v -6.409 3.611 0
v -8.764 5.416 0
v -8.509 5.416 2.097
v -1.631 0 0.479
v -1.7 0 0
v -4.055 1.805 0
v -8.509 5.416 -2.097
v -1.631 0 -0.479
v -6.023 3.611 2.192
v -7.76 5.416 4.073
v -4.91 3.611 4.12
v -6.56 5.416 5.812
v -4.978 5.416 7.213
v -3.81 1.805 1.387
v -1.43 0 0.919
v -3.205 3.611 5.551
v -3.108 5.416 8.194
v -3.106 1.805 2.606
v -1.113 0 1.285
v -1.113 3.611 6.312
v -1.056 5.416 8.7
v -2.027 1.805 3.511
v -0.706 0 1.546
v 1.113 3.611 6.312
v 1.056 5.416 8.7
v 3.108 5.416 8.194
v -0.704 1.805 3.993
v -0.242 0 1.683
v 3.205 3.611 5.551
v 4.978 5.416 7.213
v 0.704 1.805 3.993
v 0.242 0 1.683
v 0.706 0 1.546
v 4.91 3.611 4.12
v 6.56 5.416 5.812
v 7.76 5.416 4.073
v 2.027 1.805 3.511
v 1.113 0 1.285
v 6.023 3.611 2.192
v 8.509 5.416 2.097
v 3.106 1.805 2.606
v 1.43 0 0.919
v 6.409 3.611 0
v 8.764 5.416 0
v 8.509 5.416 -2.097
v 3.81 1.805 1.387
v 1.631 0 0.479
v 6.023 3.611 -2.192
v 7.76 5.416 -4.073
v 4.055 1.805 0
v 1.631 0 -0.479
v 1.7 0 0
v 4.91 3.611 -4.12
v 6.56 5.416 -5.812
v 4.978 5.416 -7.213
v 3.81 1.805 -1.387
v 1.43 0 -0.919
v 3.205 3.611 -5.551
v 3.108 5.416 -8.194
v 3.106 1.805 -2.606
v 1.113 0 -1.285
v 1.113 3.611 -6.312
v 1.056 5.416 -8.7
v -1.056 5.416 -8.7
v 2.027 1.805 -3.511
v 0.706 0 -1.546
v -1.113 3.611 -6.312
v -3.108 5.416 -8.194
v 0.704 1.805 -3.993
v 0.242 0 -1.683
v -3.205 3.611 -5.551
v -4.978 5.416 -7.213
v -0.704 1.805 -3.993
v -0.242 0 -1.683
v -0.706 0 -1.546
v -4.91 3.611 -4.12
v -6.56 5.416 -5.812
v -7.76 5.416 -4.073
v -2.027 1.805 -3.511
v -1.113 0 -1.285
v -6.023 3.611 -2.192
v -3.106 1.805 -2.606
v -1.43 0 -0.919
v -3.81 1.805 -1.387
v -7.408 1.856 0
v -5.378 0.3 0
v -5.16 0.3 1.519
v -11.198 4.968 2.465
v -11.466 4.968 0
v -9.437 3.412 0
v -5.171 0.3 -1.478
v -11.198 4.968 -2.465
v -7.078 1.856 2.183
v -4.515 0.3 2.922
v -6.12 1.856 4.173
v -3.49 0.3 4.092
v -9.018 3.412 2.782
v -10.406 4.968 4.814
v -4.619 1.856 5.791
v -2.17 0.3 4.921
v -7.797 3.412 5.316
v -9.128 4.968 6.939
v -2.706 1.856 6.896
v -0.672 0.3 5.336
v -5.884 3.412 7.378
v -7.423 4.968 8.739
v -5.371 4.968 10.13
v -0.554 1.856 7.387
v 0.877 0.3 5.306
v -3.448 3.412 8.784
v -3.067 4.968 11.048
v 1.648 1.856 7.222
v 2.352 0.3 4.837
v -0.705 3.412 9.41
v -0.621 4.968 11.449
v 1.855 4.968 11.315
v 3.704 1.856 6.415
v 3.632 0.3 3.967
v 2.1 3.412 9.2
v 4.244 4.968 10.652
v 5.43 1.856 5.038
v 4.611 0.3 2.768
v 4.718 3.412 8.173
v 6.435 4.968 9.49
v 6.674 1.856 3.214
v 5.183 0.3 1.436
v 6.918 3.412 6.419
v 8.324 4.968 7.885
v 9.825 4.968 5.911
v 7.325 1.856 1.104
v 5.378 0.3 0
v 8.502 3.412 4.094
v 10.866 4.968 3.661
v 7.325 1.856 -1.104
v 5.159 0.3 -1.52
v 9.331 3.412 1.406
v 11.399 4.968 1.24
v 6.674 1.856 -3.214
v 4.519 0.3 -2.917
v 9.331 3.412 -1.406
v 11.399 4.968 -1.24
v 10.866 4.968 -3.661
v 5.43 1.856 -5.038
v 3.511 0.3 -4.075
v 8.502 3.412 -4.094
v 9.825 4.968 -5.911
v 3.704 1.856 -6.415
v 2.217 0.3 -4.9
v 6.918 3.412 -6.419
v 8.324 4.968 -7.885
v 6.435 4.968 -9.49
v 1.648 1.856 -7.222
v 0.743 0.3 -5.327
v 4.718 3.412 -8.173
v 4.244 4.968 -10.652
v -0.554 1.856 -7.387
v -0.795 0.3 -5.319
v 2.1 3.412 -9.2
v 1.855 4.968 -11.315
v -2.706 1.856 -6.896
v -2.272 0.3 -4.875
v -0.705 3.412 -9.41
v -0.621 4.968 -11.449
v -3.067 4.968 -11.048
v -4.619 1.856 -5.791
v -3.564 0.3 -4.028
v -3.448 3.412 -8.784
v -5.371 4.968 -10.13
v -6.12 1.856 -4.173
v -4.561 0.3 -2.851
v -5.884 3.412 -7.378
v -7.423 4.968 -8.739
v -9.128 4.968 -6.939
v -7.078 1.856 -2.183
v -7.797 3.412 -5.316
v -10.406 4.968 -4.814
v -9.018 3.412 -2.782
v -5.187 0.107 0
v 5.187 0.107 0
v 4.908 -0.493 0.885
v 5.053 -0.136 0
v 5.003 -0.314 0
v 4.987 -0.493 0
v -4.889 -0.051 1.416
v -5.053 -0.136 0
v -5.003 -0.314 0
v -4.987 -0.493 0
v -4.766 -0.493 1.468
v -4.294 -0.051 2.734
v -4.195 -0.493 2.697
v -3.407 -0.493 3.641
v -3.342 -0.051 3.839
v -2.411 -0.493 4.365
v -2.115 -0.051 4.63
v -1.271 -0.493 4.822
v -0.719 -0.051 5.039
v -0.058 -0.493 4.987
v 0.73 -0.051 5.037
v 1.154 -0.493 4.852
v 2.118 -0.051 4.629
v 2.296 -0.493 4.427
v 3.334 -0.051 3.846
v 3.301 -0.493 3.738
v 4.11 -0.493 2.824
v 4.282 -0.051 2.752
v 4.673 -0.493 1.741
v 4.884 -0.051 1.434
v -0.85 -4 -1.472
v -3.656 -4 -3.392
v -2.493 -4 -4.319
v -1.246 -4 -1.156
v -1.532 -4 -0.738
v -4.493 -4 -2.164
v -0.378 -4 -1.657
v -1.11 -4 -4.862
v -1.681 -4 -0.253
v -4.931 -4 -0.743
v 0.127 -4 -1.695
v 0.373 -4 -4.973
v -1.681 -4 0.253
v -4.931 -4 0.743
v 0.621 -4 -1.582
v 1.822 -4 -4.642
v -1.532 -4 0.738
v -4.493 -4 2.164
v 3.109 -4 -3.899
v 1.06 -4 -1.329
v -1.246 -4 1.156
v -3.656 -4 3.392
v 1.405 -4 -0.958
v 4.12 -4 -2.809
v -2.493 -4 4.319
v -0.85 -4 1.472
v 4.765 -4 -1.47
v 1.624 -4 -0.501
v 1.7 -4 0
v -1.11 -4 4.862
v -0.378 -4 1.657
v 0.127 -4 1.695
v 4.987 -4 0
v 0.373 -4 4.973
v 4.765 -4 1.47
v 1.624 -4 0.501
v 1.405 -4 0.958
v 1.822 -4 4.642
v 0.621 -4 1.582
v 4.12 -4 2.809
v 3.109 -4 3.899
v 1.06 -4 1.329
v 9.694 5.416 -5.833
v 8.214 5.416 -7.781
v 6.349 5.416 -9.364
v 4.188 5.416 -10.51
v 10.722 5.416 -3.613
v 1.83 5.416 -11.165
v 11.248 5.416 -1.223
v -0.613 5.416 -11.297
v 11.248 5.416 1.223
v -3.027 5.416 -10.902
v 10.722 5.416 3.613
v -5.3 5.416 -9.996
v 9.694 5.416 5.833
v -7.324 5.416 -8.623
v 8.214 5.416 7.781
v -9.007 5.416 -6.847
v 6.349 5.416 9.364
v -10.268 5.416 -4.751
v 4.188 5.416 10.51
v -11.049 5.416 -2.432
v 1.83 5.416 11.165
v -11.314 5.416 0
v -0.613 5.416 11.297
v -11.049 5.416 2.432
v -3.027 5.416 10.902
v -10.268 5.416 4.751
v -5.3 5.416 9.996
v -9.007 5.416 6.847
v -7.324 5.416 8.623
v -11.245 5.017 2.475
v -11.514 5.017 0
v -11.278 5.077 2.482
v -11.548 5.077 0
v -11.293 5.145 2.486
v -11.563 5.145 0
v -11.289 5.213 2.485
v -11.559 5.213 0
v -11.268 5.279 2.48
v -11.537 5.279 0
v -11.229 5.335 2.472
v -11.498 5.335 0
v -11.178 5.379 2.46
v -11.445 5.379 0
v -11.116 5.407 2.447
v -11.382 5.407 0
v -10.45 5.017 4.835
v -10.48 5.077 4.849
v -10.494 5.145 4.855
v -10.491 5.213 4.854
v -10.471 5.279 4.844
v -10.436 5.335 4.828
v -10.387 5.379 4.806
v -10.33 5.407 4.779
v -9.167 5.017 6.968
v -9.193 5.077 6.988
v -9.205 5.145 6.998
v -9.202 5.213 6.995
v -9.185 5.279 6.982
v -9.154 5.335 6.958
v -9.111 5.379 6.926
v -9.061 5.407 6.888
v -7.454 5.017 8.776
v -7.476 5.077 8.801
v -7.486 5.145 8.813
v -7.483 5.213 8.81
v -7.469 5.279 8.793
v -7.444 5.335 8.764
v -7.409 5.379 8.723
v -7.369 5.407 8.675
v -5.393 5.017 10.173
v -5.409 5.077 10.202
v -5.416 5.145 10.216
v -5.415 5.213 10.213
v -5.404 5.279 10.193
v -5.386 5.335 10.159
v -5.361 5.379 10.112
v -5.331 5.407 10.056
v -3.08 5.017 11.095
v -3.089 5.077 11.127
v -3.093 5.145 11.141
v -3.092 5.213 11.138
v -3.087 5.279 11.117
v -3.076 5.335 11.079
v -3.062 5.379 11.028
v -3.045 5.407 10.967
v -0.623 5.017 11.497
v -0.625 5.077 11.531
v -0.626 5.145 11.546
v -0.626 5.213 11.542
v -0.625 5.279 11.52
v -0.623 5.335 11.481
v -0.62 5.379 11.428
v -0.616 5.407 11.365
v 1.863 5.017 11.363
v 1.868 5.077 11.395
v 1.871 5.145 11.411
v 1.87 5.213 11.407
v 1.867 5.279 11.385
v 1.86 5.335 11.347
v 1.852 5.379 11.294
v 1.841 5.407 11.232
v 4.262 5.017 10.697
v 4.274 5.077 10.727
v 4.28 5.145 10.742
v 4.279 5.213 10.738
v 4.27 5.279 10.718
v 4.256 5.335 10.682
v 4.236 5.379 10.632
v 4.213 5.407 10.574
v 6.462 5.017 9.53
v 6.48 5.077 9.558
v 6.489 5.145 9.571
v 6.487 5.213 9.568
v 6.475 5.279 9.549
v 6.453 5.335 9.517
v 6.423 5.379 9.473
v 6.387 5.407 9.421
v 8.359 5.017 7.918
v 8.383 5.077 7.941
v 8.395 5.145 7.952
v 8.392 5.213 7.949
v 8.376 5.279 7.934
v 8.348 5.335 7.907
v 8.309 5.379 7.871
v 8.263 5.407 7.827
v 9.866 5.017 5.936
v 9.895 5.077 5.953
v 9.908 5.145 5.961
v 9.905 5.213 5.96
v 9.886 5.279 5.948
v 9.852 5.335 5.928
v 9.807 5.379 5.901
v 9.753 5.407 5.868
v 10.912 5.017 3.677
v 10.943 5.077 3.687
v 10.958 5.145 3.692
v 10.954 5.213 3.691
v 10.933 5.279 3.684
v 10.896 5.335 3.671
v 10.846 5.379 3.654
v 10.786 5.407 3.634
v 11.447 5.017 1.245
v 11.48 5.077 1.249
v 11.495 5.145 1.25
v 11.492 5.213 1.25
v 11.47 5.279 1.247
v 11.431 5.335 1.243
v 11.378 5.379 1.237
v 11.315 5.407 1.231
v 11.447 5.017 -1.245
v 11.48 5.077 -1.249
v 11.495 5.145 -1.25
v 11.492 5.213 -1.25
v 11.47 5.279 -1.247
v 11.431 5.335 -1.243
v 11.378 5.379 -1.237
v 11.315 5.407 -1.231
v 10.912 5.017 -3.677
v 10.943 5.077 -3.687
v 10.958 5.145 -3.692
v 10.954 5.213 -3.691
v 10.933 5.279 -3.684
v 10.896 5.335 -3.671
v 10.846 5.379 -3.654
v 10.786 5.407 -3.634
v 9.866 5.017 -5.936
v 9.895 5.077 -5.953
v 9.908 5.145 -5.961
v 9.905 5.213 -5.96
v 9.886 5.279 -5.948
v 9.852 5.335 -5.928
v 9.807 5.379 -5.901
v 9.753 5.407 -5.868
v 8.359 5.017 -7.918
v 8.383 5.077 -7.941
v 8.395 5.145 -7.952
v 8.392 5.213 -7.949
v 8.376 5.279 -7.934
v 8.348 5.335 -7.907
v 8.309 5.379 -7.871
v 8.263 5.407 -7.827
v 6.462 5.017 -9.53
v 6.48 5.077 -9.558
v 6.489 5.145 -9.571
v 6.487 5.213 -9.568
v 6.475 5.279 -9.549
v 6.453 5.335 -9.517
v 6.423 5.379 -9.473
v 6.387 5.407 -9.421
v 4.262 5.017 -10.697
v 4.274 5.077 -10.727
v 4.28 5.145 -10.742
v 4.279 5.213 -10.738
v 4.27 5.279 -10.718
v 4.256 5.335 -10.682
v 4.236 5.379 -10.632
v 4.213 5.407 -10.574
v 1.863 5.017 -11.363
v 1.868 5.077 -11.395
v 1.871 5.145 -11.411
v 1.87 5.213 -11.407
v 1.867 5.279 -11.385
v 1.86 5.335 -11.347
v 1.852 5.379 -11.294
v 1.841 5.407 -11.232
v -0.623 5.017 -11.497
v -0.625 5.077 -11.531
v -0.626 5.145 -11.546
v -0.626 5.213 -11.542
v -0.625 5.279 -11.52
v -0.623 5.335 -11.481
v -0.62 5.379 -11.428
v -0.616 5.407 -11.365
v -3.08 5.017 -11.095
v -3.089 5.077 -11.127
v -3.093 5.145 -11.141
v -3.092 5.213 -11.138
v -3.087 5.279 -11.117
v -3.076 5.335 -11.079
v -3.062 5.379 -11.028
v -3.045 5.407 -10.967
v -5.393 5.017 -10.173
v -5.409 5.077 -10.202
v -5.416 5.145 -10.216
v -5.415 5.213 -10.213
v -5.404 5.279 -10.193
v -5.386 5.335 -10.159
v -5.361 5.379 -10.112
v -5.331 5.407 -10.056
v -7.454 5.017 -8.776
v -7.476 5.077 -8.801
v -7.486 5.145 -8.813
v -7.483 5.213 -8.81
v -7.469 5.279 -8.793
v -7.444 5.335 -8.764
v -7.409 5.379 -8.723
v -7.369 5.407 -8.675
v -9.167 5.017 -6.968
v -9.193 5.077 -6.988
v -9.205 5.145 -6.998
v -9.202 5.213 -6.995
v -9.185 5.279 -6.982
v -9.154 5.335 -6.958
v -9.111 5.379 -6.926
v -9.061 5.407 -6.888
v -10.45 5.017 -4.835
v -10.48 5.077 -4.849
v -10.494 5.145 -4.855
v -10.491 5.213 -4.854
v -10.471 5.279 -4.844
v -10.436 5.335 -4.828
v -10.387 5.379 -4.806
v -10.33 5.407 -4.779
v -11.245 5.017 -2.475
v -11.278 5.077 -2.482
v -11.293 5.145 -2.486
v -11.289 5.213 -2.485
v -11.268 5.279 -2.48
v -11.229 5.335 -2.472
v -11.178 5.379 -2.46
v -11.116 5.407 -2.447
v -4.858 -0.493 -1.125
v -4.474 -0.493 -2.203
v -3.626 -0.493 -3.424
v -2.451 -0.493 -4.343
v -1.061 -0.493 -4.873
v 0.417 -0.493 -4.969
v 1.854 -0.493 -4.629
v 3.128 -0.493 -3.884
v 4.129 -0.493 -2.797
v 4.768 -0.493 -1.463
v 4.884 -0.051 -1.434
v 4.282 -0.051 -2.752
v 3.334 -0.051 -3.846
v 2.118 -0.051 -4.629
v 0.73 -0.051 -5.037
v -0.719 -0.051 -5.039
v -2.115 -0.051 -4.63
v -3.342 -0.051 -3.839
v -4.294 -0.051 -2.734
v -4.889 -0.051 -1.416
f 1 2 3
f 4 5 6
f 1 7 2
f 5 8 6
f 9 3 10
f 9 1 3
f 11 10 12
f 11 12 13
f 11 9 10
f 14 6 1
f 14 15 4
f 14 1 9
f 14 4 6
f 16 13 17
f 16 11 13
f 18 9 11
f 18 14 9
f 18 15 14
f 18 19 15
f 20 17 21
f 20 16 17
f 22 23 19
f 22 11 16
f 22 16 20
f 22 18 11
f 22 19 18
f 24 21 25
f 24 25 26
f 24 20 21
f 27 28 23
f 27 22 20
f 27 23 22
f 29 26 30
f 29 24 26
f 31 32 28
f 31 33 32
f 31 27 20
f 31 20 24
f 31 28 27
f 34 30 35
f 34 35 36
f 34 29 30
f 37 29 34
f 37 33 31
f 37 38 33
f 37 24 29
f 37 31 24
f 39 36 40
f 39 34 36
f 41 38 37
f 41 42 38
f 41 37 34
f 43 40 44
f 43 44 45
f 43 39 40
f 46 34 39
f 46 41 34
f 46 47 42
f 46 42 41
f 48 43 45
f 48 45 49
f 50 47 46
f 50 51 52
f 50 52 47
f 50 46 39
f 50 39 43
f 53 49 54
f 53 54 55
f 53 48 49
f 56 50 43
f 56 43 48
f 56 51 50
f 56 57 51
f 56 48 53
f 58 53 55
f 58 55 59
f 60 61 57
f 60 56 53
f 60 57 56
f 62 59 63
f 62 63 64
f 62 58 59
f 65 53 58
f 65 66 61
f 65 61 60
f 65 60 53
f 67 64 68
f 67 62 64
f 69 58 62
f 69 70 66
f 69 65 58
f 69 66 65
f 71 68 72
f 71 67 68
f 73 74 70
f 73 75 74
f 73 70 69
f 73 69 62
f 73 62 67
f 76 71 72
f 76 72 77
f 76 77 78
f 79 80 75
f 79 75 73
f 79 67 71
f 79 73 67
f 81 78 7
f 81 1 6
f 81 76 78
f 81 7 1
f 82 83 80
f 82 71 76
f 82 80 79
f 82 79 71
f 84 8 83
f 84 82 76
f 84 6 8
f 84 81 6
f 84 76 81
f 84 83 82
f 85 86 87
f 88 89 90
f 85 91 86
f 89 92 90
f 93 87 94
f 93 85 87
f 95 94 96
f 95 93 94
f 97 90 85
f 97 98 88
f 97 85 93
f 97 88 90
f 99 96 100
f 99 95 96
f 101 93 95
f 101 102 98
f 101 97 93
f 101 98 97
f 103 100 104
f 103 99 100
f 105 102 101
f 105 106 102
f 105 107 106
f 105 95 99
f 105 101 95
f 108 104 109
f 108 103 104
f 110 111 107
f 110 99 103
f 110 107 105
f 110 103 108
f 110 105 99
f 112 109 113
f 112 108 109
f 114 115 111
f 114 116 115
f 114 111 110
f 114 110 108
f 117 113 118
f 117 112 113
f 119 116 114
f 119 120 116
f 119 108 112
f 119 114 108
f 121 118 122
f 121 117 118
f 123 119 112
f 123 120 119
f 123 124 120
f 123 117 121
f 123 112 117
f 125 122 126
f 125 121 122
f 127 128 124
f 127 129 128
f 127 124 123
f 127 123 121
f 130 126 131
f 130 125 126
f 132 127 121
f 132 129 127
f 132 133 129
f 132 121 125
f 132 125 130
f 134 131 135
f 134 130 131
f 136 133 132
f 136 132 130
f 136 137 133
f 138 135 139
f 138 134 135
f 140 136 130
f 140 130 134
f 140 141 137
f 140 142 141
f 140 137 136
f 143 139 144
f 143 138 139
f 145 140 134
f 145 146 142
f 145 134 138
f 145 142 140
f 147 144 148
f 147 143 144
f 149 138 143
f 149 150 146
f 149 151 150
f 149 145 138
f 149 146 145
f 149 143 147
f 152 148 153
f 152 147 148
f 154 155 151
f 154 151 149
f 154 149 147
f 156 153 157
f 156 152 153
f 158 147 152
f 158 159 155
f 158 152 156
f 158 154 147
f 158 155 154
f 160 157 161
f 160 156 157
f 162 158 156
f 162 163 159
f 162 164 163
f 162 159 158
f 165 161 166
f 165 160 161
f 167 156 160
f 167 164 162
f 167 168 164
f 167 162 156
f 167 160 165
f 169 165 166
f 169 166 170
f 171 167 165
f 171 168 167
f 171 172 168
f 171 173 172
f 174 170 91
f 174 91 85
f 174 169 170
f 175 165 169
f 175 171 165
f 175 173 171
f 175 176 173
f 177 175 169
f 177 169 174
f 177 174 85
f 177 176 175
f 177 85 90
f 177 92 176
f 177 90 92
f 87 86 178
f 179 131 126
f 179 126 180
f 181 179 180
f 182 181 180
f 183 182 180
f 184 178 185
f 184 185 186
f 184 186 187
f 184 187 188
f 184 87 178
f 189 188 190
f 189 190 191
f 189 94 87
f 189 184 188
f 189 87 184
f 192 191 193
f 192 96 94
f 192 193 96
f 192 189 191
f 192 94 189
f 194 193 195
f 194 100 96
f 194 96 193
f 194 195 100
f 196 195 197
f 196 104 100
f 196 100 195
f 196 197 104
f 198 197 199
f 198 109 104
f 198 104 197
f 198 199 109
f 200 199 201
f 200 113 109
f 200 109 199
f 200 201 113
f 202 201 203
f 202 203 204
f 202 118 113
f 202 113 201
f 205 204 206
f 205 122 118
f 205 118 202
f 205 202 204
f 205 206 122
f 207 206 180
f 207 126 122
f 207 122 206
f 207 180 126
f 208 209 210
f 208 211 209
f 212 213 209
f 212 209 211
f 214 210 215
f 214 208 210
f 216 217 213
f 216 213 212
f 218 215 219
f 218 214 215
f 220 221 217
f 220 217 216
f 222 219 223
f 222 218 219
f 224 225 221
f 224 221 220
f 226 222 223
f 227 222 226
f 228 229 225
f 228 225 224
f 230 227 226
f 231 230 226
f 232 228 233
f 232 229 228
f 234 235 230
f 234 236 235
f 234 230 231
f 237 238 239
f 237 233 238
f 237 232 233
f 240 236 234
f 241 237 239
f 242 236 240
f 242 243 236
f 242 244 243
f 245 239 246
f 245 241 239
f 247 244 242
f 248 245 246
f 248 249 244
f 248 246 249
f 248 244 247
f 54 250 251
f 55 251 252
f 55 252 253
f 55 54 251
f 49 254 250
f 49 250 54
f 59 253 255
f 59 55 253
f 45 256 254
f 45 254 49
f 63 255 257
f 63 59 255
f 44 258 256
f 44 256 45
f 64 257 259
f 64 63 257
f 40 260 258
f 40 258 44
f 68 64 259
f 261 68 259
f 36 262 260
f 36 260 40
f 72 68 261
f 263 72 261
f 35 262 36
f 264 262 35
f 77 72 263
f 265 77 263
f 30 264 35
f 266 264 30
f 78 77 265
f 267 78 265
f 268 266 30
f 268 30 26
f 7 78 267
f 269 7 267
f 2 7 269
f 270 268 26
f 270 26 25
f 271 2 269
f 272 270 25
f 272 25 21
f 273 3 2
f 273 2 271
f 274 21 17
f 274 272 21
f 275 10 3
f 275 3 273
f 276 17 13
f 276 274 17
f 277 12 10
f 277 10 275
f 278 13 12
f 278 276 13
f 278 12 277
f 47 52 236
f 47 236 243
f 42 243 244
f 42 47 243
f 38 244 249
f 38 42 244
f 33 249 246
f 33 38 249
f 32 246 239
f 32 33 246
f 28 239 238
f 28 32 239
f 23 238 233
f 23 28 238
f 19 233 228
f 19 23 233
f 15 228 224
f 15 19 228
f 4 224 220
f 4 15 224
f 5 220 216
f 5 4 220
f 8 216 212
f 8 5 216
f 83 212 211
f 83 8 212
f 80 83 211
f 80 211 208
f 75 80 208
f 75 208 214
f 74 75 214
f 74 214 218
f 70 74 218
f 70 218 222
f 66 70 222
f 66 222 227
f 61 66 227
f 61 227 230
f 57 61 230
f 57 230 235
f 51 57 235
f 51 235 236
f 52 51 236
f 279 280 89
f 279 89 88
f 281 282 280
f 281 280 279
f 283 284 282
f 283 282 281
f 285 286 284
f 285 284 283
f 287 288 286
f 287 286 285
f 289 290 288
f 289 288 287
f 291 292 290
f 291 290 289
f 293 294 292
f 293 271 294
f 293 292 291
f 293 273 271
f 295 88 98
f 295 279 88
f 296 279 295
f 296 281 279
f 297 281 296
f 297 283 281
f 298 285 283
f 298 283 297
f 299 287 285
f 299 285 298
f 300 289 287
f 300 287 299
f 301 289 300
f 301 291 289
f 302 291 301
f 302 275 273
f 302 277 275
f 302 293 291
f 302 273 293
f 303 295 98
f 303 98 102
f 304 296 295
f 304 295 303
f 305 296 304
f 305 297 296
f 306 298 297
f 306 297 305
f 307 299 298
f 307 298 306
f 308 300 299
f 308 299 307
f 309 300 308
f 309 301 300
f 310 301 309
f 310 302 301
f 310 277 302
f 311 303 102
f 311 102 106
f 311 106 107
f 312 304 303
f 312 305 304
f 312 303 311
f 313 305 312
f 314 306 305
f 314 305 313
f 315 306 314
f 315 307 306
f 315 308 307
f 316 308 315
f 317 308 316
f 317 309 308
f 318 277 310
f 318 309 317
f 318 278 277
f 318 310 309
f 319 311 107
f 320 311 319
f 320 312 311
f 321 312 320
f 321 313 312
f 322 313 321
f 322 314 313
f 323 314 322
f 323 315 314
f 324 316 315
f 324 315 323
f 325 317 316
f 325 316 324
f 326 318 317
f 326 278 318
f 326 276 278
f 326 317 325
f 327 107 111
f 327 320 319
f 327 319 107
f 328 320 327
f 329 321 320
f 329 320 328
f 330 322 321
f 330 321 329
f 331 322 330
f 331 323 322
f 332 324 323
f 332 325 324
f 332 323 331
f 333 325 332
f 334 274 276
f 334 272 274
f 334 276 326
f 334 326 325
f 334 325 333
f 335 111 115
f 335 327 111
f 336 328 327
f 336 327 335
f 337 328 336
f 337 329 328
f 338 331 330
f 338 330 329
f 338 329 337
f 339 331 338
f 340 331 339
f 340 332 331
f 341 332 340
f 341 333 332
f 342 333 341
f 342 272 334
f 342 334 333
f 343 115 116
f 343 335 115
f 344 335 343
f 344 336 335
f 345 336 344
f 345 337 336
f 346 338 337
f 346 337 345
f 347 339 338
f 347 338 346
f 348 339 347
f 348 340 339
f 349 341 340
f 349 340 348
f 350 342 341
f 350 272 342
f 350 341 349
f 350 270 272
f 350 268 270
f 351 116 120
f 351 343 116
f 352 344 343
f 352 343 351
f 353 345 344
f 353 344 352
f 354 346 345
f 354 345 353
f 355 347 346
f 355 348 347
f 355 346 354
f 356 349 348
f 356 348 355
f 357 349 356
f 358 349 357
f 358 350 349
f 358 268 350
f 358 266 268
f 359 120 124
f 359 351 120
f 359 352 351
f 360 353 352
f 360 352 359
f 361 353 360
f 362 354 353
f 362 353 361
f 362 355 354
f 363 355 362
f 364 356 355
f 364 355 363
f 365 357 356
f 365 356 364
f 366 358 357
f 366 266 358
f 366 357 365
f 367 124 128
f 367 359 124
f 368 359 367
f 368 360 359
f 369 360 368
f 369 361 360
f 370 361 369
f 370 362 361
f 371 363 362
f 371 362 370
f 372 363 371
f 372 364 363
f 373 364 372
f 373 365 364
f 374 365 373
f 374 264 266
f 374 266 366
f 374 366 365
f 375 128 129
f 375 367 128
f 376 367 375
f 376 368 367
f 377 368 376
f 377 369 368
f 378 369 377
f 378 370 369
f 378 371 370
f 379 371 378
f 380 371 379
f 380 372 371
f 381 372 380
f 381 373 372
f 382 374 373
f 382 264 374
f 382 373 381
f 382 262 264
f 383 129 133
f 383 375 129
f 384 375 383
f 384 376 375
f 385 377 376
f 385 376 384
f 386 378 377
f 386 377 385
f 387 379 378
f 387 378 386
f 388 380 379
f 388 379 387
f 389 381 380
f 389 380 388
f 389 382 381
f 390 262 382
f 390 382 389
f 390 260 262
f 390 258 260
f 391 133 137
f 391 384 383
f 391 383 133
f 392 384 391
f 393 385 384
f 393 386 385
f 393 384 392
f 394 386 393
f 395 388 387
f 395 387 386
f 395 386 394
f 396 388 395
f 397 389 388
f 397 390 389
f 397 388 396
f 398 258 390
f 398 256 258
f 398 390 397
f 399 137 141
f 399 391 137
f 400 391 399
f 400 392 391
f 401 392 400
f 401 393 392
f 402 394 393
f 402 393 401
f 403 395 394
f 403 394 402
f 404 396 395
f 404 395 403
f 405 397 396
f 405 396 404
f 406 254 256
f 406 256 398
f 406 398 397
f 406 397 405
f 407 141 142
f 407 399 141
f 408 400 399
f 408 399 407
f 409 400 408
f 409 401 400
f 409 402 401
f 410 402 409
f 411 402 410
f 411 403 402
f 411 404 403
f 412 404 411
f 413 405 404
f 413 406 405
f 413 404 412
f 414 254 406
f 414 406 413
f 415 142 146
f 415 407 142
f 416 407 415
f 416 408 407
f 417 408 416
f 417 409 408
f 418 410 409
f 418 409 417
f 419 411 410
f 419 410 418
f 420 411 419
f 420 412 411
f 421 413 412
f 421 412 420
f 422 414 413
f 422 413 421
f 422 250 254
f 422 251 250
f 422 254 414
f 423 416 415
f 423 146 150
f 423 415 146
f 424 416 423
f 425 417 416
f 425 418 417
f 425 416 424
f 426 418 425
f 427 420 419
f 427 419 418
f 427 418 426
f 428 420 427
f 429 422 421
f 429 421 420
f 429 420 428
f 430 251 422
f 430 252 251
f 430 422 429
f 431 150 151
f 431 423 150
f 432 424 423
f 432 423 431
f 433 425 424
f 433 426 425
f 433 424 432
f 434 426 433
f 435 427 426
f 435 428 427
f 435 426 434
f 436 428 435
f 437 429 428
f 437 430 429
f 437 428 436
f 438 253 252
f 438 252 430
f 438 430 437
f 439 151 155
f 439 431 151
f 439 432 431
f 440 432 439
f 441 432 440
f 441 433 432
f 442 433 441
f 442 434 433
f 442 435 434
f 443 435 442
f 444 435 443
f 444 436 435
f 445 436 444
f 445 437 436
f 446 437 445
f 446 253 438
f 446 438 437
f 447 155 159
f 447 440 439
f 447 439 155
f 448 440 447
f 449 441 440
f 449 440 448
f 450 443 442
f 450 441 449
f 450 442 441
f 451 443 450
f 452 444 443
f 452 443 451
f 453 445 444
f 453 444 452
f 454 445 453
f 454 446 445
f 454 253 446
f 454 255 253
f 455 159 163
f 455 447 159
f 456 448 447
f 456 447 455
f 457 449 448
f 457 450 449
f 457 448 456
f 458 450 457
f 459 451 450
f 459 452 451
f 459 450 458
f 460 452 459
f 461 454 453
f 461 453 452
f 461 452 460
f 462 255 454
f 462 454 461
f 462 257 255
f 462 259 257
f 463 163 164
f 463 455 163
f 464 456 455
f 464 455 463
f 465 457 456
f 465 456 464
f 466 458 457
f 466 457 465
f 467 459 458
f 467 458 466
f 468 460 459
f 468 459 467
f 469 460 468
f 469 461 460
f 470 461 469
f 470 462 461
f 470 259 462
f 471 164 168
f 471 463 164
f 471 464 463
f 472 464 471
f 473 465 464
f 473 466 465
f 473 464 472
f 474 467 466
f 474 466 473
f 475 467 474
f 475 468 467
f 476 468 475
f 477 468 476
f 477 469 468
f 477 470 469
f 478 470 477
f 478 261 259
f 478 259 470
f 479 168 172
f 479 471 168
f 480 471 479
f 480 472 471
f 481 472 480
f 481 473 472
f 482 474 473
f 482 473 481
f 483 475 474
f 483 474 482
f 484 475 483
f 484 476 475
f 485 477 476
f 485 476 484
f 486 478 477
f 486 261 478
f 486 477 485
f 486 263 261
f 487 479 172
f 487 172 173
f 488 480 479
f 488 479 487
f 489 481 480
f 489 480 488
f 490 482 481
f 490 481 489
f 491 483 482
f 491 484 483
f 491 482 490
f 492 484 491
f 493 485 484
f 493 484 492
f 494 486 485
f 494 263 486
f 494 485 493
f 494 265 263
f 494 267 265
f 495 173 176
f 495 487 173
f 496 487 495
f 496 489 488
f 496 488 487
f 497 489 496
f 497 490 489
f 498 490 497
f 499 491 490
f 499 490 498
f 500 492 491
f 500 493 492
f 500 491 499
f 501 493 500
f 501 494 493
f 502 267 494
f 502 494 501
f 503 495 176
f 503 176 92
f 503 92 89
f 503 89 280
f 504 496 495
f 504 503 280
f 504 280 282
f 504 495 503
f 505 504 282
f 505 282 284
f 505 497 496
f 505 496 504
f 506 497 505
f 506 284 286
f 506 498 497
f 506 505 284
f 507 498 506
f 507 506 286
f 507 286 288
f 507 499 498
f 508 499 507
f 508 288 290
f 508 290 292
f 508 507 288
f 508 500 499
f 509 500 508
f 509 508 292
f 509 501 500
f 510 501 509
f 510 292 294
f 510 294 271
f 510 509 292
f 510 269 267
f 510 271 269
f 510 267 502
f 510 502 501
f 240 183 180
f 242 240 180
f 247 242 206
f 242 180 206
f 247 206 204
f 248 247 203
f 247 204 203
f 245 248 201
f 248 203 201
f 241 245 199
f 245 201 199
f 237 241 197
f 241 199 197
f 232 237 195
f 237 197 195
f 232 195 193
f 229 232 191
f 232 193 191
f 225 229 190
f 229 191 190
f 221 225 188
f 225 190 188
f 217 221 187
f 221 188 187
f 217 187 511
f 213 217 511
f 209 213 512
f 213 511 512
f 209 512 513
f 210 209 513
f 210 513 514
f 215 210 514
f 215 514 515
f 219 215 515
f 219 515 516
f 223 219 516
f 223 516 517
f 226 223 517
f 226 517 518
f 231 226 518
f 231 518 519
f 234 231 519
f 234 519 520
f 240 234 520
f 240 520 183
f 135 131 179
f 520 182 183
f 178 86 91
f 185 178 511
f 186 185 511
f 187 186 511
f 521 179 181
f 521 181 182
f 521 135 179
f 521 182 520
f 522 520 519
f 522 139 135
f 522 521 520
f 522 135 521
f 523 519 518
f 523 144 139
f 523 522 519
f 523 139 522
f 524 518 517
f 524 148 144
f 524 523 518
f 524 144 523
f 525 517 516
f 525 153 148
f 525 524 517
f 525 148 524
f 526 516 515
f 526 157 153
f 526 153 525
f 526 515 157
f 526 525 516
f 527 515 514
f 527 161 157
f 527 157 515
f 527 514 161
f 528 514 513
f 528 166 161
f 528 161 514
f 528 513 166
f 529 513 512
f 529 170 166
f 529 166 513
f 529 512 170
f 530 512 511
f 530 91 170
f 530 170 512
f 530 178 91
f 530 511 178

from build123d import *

# Parameters (mm, degrees)
SKETCH2_R           = 4.986862764
SKETCH2_R_2         = 1.7
BOSS_EXTRUDE1_DEPTH = 4
FILLET1_R           = 0.25
FILLET2_R           = 1


with BuildPart() as part:
    # Sketch1 → Revolve1 (revolve)
    with BuildSketch(Plane.XY):
        Polygon((-1.7, 0), (-4.986862764, 0), (-12.050794784, 5.416408), (-8.76393202, 5.416408), align=None)
    revolve(axis=Axis((0, 0, 0), (0, 1, 0)))

    # Sketch2 → Boss-Extrude1 (add)
    with BuildSketch(Plane.XZ):
        Circle(SKETCH2_R)
        Circle(SKETCH2_R_2, mode=Mode.SUBTRACT)
    extrude(amount=BOSS_EXTRUDE1_DEPTH)

    # Fillet1
    fillet1_edges = [part.edges().sort_by_distance(p)[0] for p in [
        (12.050794784, 5.416408, 0),
    ]]
    fillet(fillet1_edges, radius=FILLET1_R)

    # Fillet2
    fillet2_edges = [part.edges().sort_by_distance(p)[0] for p in [
        (0, 0, -4.986862764),
    ]]
    fillet(fillet2_edges, radius=FILLET2_R)


solid = part.part
